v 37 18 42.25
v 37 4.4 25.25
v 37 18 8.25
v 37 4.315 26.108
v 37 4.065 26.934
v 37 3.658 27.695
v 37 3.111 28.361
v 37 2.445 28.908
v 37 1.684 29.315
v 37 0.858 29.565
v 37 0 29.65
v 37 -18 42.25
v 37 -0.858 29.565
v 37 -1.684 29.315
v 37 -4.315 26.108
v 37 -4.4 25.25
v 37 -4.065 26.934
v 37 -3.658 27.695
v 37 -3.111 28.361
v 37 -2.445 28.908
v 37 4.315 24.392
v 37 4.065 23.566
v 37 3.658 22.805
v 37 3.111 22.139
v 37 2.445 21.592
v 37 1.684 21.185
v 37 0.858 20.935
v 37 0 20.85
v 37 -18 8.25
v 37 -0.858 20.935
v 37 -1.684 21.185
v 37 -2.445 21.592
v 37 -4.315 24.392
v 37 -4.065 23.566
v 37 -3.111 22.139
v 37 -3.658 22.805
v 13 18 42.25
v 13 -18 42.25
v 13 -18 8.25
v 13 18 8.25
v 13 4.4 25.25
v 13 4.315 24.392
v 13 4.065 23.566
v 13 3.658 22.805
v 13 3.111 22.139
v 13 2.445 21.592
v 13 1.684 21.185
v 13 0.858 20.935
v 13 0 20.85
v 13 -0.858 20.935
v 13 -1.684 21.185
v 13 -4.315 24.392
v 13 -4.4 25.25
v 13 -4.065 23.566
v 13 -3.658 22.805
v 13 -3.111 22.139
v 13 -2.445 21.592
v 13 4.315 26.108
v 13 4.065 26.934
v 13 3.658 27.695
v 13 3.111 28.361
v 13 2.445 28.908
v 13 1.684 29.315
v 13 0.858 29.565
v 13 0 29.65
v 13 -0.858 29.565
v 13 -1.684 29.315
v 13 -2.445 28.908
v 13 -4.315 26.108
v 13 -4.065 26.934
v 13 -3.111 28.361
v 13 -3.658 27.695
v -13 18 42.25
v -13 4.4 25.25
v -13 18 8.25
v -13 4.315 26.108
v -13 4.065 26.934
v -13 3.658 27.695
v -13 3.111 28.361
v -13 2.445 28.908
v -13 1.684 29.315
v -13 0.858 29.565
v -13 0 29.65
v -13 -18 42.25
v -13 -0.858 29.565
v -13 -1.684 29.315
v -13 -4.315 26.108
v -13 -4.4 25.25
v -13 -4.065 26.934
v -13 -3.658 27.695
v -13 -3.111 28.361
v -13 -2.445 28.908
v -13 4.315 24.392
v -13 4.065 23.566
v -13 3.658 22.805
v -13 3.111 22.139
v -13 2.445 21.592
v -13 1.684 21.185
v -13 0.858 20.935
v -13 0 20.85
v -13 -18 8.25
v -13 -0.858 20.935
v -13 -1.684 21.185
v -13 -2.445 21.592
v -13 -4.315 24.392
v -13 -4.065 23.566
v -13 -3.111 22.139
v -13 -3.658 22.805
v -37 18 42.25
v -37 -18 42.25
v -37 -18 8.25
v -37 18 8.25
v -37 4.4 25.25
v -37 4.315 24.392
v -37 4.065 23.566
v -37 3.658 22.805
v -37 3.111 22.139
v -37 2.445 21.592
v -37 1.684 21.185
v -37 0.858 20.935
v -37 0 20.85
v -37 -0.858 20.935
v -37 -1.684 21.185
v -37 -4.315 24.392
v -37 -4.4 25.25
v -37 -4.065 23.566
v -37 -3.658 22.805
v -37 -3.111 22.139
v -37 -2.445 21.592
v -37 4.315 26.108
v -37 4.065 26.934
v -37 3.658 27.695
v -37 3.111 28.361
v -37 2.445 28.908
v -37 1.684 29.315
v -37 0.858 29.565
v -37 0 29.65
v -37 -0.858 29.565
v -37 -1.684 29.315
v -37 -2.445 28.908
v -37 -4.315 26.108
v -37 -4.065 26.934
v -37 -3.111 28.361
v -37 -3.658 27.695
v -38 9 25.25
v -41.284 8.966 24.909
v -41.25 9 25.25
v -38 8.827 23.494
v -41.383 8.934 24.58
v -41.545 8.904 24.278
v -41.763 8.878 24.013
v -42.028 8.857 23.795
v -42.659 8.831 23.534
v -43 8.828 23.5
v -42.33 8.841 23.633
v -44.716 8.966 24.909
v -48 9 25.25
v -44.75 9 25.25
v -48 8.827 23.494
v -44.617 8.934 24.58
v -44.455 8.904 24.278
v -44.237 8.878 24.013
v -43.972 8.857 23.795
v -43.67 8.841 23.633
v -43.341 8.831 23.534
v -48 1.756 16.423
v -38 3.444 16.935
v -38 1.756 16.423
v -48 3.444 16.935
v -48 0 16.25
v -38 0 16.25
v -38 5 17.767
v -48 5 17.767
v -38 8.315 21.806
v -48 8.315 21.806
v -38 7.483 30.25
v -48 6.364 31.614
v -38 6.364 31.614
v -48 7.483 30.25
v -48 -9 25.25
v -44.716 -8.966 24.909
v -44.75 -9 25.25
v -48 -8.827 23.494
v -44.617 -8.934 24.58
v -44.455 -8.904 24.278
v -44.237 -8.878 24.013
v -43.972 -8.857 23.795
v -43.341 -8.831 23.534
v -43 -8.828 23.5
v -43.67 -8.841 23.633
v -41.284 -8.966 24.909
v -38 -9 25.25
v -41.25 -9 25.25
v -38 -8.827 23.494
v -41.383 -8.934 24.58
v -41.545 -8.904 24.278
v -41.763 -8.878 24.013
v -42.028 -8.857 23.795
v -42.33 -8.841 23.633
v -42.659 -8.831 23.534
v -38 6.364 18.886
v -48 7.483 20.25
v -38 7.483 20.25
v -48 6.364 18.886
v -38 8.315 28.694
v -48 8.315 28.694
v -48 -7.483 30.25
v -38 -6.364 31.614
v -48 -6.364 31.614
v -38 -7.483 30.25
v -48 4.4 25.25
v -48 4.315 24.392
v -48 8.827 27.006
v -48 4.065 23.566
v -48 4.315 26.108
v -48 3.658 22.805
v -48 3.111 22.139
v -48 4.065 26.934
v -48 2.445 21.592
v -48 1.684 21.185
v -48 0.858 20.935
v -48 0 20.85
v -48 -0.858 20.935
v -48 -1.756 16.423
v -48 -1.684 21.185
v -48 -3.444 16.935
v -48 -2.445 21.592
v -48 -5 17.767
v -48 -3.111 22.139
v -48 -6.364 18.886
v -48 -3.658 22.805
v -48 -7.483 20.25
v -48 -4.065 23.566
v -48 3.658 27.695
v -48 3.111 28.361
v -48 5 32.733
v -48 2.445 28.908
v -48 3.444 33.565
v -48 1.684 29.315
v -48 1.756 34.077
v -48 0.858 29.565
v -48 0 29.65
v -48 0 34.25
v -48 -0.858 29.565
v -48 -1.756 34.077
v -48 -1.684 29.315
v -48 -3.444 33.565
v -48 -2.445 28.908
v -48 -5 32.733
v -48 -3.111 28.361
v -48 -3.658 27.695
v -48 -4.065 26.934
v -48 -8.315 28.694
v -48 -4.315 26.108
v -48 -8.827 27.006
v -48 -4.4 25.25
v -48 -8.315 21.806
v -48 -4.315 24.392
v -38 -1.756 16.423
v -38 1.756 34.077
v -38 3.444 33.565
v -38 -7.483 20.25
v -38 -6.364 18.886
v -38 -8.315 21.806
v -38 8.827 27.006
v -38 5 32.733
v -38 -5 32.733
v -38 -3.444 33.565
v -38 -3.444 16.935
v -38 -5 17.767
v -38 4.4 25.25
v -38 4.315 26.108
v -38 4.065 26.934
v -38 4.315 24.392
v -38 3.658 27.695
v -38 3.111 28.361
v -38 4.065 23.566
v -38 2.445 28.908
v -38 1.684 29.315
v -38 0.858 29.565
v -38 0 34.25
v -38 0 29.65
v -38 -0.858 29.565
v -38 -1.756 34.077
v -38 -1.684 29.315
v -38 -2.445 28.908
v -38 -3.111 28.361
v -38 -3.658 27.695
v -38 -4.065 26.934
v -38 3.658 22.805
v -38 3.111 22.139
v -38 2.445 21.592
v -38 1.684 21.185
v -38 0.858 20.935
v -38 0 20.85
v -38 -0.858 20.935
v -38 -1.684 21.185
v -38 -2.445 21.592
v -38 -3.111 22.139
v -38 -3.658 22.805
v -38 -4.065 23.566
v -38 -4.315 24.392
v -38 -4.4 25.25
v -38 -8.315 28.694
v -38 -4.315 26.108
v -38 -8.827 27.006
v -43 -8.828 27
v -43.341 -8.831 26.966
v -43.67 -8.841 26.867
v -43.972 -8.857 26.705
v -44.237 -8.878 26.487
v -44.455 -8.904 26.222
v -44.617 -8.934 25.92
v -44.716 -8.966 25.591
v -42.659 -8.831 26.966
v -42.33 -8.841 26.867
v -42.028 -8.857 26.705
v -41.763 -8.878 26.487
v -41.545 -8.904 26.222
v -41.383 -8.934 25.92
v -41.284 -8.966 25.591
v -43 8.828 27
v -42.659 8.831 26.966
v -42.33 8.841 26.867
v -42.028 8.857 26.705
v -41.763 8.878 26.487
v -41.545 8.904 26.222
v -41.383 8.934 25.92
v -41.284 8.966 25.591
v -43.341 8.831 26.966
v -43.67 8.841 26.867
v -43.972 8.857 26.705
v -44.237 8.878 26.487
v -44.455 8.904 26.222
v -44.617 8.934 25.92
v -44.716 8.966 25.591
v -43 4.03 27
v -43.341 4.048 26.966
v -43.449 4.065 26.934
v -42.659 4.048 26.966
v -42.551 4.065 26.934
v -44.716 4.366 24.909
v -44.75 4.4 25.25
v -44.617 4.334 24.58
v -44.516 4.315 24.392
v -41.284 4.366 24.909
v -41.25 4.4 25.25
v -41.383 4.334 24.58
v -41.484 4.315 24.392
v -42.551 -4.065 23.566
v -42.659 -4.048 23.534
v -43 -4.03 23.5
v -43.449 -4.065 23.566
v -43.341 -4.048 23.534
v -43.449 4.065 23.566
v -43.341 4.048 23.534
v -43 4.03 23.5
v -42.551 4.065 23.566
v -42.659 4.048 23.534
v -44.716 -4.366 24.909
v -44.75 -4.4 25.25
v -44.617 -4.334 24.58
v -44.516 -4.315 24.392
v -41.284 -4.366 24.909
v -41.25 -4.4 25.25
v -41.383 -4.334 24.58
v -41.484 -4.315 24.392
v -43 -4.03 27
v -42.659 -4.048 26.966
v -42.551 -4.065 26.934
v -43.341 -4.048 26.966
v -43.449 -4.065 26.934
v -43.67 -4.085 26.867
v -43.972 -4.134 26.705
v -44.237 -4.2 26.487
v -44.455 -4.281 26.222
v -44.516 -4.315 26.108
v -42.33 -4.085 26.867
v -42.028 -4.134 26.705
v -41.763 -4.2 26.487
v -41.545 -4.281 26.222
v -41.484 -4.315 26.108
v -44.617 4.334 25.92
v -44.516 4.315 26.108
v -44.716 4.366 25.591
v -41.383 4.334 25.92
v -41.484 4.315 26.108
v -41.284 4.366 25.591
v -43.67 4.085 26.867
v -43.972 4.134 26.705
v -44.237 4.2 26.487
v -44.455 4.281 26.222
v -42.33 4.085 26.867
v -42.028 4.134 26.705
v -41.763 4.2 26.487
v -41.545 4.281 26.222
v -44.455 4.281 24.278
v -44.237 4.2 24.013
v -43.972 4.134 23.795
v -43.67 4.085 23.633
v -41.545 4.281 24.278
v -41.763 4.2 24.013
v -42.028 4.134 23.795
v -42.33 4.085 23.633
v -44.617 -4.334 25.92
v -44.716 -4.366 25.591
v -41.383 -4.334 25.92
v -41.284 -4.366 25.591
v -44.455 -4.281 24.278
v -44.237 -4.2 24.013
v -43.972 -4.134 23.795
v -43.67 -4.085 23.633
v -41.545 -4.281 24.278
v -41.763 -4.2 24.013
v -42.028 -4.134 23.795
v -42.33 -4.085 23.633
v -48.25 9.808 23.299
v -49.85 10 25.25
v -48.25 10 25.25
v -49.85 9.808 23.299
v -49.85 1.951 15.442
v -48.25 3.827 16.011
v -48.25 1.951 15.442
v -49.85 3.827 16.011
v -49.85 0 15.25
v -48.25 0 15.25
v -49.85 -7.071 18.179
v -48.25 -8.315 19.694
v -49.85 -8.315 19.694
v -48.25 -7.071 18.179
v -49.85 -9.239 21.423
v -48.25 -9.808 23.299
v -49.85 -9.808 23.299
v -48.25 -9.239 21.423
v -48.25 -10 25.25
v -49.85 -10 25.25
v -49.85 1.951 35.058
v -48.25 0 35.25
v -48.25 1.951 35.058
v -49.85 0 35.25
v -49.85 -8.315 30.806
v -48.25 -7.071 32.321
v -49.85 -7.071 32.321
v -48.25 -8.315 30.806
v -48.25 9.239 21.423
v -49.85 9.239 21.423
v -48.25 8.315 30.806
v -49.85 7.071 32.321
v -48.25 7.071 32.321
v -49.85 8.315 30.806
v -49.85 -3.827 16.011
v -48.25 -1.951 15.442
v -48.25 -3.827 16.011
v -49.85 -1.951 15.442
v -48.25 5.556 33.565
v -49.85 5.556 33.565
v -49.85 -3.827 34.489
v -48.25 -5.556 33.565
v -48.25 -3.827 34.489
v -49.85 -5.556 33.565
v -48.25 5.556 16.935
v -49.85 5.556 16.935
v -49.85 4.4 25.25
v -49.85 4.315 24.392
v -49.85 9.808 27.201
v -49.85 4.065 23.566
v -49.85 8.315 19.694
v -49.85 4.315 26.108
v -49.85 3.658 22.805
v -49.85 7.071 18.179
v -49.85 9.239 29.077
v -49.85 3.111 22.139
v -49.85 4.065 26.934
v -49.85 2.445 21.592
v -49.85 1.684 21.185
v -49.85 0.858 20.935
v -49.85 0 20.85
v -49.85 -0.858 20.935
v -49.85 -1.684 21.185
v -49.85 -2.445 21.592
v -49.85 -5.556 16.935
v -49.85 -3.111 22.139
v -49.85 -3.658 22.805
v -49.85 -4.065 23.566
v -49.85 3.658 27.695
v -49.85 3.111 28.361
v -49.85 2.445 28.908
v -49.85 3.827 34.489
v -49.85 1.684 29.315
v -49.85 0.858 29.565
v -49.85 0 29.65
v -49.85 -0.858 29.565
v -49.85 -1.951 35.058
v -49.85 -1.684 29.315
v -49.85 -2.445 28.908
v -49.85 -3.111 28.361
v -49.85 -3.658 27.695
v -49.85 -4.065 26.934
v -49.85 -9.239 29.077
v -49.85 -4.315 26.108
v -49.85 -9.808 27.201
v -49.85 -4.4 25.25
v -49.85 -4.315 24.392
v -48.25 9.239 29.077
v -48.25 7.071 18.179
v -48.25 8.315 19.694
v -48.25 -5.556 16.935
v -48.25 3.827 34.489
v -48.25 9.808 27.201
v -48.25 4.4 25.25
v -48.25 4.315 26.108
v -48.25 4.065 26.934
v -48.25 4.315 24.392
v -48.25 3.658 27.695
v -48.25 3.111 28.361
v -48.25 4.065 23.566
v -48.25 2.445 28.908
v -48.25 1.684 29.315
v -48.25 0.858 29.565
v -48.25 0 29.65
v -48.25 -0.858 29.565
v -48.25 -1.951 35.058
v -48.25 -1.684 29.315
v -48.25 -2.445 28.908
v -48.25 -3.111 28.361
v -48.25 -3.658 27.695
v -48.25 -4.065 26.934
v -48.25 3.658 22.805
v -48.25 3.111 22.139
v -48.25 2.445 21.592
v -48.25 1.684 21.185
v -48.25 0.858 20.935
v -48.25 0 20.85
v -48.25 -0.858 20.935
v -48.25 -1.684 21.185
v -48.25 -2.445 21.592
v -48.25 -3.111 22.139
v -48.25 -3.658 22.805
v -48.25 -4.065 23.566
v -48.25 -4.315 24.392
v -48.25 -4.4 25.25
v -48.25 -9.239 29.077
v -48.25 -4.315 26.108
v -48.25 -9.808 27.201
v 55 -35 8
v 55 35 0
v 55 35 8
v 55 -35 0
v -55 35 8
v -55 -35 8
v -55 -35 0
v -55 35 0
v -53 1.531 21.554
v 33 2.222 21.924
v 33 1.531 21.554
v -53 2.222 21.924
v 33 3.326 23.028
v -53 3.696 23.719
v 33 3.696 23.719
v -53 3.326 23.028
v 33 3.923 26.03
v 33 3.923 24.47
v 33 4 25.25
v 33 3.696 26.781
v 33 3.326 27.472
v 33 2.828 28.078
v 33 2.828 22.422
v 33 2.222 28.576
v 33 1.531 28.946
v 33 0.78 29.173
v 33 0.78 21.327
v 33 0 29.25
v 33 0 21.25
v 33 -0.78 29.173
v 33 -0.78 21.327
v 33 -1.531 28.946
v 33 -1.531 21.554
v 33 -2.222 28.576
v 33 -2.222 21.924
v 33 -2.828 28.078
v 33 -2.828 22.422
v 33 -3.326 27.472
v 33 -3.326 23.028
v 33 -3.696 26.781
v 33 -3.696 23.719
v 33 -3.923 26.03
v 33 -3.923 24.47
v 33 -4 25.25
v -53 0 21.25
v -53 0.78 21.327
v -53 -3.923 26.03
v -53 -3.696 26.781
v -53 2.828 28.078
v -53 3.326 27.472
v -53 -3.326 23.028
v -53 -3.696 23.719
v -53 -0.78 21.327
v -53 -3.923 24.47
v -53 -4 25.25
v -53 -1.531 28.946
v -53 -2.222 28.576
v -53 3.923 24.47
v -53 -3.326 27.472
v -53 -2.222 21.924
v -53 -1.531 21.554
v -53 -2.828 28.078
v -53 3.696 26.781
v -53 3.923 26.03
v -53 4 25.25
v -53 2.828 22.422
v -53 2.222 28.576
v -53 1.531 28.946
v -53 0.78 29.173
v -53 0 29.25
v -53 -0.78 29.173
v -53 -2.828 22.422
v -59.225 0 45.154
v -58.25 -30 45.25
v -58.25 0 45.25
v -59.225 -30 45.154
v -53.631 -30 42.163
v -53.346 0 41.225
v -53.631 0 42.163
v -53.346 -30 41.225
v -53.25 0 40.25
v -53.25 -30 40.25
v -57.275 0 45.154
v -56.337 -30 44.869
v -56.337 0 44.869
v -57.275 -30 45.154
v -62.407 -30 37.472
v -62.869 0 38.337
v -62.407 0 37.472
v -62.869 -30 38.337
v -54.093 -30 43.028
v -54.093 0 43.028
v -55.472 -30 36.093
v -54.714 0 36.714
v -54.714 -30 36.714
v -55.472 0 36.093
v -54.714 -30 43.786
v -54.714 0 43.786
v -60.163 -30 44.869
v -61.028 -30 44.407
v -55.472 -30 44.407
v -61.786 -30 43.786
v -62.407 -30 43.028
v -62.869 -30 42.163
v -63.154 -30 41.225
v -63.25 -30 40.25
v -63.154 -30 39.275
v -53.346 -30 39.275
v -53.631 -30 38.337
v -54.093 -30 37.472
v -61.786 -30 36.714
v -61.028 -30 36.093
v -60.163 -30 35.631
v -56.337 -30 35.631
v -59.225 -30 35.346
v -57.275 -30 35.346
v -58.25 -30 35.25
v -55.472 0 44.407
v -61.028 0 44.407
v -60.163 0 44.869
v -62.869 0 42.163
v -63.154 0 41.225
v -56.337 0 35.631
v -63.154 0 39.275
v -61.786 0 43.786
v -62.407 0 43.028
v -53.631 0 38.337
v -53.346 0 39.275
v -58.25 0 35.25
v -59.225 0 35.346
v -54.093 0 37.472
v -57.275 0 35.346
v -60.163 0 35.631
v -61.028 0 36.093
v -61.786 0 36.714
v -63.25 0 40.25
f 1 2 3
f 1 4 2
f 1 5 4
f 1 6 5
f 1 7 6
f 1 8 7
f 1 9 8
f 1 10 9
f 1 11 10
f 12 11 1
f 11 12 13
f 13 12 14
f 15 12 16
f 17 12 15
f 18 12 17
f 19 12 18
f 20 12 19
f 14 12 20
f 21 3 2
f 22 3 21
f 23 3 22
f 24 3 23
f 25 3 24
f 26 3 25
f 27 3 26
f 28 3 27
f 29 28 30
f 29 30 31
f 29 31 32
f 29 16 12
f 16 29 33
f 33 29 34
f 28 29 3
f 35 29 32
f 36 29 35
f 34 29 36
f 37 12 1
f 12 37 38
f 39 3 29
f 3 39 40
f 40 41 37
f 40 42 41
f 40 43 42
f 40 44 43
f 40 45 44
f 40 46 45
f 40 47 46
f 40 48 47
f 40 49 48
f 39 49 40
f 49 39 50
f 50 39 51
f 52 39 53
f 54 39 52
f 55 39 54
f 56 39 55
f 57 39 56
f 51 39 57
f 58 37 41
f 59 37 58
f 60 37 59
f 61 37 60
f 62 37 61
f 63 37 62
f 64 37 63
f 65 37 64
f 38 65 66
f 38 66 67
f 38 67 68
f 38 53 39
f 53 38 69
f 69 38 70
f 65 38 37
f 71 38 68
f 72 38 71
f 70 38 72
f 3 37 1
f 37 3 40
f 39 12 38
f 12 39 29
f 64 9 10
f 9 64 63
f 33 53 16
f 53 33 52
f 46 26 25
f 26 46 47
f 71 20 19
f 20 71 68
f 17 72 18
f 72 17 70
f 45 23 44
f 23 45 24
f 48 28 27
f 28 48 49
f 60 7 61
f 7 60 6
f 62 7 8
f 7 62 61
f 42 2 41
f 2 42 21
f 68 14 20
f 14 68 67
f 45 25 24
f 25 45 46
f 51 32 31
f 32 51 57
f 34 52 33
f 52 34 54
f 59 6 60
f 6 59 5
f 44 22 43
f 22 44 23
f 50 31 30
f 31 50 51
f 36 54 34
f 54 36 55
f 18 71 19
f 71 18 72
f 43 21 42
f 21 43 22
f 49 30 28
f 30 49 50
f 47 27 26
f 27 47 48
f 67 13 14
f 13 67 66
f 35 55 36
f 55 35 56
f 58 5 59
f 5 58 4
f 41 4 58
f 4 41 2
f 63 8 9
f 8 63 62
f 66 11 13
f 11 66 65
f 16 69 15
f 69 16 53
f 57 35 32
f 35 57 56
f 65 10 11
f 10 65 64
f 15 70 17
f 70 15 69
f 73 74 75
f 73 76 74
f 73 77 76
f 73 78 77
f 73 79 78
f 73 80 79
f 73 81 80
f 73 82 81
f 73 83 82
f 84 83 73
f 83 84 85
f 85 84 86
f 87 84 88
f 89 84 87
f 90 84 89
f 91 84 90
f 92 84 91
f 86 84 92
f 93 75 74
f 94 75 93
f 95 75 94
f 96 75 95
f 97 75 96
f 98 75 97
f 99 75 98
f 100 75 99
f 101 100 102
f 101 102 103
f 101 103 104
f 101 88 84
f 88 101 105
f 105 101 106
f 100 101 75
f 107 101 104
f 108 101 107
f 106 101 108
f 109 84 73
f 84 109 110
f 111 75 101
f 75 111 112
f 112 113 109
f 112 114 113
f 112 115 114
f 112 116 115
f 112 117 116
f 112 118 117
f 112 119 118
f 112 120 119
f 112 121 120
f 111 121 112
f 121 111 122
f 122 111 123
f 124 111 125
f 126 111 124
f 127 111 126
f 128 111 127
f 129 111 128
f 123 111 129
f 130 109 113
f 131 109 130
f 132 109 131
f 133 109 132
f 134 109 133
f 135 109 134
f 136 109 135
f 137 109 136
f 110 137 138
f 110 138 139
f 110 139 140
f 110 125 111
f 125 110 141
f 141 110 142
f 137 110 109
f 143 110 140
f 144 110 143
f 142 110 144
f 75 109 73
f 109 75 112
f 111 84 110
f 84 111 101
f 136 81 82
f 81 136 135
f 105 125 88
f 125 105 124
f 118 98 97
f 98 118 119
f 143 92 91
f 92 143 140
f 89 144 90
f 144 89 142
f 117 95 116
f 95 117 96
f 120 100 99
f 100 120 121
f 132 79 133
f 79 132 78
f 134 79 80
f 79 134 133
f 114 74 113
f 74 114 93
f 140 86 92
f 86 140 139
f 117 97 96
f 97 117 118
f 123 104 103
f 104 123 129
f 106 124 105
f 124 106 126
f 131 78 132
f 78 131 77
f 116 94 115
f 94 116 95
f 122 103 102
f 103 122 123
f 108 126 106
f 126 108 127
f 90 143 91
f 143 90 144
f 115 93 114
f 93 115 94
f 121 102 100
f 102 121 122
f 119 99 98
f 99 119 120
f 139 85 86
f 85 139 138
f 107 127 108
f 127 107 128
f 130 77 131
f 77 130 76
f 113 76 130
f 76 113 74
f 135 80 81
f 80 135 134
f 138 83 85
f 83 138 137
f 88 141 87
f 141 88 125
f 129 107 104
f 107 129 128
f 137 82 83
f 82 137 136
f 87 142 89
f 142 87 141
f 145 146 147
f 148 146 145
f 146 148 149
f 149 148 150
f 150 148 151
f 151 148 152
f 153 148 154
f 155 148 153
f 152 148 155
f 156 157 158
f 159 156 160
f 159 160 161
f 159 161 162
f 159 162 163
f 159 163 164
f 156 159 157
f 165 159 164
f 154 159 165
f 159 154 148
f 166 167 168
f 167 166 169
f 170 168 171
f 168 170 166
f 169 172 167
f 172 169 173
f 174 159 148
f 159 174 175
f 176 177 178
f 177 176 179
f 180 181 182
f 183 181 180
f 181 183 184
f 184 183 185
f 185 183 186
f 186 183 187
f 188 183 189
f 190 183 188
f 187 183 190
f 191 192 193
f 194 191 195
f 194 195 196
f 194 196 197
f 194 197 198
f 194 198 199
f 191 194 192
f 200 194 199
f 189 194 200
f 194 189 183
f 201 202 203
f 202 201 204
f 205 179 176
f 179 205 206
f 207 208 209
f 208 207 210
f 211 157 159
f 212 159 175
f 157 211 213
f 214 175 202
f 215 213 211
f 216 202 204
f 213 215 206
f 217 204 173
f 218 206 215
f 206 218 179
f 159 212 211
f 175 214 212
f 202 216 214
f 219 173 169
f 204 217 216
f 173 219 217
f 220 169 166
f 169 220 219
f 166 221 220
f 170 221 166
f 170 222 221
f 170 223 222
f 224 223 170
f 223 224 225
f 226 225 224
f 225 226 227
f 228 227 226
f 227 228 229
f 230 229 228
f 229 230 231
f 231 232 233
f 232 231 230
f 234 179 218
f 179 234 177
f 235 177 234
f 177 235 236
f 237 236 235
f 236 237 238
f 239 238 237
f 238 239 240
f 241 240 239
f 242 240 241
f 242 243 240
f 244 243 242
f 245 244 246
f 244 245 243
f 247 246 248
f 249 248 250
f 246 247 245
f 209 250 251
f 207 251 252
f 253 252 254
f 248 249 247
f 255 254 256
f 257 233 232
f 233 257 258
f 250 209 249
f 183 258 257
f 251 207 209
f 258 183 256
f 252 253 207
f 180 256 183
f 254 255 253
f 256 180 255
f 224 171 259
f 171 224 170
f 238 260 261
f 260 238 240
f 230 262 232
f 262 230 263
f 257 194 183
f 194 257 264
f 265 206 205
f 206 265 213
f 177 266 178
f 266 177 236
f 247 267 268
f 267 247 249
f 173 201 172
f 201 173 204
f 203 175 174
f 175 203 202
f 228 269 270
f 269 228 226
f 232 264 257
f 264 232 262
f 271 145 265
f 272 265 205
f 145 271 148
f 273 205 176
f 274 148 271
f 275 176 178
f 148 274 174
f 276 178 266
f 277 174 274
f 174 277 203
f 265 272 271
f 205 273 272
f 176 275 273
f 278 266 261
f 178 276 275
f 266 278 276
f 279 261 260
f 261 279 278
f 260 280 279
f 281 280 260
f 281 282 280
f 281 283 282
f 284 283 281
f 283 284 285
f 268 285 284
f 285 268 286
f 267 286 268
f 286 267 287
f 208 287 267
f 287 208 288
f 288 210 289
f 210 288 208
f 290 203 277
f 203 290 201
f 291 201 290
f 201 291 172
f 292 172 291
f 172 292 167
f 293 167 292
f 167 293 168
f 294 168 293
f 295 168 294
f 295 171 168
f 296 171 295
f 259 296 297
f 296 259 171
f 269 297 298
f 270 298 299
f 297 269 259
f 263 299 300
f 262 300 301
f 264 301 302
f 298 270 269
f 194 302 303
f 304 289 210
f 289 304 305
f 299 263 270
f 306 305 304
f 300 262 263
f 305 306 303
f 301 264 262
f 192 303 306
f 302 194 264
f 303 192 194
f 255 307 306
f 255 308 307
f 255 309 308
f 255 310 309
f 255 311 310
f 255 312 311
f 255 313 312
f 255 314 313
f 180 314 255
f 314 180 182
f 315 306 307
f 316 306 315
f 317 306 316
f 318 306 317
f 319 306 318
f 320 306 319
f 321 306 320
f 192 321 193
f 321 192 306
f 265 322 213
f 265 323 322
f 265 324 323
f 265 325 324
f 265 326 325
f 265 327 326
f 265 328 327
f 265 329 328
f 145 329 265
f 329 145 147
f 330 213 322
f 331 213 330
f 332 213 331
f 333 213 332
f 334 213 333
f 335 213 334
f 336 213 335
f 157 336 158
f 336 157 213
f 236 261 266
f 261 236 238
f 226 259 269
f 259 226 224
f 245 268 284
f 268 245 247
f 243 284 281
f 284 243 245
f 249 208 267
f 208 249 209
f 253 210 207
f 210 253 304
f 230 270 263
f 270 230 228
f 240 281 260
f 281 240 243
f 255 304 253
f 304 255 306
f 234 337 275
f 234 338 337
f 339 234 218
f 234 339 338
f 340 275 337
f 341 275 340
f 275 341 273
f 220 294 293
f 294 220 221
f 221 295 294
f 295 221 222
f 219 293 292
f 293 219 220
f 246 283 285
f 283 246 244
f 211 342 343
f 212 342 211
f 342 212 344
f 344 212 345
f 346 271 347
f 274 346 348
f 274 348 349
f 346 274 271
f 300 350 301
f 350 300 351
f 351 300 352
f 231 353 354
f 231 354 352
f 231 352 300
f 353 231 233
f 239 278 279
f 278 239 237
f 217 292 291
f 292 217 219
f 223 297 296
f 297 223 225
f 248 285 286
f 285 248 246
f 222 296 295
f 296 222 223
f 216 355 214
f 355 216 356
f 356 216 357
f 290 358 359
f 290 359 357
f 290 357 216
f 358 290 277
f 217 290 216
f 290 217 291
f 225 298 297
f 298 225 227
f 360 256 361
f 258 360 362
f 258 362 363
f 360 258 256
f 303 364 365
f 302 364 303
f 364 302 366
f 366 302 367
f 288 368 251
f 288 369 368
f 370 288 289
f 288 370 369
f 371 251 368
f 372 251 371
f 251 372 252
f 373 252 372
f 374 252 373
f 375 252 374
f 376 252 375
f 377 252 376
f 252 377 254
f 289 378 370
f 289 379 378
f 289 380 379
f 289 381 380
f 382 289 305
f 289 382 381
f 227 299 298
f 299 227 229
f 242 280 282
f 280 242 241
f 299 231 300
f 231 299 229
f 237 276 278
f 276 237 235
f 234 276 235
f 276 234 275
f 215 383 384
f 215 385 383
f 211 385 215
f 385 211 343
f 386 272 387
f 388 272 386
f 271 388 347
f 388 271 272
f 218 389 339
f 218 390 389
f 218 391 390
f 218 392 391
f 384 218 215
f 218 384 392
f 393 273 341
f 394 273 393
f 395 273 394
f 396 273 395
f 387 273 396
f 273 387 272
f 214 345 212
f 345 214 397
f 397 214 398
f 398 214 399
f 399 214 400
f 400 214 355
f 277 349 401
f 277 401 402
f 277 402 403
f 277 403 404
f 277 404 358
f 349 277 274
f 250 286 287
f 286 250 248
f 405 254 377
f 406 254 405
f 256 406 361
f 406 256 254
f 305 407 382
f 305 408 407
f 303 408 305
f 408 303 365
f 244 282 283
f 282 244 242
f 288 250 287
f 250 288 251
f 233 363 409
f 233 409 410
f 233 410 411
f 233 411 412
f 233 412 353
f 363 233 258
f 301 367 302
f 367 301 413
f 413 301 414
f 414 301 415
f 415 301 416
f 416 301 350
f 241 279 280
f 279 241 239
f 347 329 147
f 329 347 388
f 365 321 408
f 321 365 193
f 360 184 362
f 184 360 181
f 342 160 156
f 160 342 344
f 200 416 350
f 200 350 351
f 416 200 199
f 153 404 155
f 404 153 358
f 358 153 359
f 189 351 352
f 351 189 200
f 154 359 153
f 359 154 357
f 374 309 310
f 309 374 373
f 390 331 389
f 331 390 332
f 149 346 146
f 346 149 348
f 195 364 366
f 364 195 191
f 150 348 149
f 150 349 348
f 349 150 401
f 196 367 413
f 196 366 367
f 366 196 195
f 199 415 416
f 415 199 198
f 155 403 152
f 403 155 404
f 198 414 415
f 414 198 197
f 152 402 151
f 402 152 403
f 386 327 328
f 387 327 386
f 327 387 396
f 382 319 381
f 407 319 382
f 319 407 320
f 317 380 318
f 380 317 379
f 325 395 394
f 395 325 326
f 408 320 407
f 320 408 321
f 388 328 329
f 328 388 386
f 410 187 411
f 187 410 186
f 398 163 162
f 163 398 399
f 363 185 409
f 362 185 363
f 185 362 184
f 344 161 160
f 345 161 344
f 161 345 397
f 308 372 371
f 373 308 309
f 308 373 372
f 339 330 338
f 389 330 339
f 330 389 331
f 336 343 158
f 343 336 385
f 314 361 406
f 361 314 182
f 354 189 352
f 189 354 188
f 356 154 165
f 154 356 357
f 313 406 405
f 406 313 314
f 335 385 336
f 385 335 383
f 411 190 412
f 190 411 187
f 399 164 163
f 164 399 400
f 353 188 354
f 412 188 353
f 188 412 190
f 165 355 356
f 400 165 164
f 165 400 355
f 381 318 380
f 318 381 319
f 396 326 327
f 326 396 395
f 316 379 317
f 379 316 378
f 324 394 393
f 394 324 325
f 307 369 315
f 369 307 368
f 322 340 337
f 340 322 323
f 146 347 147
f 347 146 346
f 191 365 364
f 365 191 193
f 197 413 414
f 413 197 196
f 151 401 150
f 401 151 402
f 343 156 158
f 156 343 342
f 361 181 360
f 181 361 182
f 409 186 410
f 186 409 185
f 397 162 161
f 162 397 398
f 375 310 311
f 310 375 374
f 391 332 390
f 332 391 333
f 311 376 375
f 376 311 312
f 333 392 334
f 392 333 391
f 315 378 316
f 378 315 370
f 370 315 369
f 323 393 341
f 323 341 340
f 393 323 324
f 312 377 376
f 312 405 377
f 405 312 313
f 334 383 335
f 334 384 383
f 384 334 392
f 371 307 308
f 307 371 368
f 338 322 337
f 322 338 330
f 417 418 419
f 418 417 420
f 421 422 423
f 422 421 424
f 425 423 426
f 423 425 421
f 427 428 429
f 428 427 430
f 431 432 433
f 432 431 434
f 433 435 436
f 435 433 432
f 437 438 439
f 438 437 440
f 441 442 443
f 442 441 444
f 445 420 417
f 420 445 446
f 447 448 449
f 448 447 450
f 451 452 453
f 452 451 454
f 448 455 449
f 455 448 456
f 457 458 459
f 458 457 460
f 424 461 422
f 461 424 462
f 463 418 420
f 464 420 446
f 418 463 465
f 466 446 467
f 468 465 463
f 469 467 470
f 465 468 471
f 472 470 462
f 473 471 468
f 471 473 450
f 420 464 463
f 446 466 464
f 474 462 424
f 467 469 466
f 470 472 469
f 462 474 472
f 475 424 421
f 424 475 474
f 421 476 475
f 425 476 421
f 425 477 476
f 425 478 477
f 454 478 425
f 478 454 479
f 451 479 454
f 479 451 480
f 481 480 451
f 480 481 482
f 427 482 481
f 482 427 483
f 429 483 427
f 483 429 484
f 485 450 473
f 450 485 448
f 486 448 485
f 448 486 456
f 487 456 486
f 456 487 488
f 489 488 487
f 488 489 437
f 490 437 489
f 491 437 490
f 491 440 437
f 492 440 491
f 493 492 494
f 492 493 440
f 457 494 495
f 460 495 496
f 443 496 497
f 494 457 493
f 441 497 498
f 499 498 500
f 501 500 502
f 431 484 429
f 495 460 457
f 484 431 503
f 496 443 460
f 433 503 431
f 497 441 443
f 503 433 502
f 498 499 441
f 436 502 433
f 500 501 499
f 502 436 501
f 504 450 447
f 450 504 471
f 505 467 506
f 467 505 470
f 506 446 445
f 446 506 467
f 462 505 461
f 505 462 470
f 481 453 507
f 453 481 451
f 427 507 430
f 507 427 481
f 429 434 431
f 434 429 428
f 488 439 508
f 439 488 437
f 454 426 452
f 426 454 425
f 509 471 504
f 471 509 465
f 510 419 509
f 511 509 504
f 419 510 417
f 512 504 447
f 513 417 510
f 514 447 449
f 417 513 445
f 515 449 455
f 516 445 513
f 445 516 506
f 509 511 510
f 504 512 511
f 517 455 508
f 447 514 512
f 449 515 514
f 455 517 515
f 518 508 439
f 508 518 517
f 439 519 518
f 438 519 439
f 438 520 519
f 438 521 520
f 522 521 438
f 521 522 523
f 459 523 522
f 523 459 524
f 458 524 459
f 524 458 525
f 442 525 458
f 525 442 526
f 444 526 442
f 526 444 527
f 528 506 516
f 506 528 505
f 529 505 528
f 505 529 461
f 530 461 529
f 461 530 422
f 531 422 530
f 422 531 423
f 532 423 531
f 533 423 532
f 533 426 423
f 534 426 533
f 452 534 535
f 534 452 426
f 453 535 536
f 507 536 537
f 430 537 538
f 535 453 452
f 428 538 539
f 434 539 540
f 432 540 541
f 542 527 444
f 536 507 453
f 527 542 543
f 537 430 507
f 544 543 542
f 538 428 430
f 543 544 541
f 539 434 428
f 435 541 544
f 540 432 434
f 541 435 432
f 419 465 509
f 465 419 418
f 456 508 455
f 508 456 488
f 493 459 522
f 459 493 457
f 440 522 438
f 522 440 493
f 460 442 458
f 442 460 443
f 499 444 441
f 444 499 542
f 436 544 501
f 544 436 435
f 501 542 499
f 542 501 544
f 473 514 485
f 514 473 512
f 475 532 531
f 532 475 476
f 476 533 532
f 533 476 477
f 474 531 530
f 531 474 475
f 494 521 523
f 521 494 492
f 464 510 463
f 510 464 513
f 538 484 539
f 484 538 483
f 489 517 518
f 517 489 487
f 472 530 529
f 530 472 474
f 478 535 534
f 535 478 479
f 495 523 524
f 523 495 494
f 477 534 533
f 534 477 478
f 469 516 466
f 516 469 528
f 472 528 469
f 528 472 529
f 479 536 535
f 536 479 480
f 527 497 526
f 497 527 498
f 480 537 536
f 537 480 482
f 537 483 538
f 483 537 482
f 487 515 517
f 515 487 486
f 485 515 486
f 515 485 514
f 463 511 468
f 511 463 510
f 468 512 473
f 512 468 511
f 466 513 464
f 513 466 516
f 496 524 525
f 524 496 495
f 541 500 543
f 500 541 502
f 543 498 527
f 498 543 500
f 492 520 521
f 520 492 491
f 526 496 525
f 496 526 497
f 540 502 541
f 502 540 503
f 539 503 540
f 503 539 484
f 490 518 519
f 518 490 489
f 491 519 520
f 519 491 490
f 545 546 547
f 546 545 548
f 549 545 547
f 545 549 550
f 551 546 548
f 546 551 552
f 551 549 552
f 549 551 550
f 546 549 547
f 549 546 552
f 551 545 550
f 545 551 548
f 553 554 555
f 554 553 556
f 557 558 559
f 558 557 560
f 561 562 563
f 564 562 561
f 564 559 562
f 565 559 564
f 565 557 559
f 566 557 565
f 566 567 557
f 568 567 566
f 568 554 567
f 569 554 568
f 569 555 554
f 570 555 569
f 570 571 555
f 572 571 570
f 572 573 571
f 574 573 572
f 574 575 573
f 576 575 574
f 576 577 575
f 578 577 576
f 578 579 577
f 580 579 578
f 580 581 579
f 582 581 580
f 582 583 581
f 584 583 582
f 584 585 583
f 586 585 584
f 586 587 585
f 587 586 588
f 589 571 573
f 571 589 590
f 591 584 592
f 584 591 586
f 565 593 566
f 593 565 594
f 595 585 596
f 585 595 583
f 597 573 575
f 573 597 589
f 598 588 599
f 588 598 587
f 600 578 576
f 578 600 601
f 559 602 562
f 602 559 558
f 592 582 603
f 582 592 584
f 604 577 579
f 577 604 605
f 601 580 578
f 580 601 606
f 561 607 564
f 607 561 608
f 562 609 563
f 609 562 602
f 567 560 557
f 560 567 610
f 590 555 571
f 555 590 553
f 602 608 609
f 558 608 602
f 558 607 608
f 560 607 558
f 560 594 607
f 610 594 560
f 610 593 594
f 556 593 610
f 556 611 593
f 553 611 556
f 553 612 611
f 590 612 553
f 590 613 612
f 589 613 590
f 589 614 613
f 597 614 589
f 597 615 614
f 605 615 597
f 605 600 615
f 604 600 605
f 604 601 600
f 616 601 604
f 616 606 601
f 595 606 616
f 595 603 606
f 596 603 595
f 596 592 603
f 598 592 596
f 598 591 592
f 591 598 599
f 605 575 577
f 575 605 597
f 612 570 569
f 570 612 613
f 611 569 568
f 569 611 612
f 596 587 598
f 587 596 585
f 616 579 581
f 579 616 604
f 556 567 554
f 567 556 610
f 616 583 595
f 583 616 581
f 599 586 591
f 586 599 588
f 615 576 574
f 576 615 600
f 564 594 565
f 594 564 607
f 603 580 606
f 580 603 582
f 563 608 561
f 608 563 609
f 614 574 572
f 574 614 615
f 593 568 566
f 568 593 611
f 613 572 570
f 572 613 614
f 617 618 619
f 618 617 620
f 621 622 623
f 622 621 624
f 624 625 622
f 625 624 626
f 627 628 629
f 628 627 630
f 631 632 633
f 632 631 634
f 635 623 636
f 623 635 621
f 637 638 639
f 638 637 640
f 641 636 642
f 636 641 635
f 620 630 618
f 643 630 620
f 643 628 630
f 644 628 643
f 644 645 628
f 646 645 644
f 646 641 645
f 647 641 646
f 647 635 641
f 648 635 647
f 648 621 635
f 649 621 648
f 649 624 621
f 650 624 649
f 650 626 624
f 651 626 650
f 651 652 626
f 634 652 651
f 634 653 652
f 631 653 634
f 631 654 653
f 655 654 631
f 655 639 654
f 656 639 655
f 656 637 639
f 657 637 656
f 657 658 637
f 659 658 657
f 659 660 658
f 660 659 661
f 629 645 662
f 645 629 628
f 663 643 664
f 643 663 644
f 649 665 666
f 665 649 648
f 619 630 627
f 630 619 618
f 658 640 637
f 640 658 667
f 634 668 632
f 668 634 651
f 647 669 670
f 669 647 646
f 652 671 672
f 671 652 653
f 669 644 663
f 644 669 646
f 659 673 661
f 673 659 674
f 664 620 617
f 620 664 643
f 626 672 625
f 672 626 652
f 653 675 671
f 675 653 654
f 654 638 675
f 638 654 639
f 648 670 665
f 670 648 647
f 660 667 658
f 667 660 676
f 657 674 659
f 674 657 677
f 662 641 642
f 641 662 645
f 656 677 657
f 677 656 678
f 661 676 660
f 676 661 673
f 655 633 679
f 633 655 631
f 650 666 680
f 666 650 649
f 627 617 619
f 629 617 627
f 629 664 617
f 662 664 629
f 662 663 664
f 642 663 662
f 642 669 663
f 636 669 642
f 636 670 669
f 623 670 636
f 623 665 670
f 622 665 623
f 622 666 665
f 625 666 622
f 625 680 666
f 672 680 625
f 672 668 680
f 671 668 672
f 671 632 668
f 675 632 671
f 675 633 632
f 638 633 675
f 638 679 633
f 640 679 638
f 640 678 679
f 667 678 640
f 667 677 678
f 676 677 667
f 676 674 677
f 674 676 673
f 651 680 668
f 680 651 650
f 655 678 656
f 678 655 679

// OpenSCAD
$fn = 32;

// ------------------------------------------------------------------------
// Machine vise: screw d8, jaws 24 x 34 mm
// Every part is its own module, assembly() places every instance.
// ------------------------------------------------------------------------

// --- part 1 ---
module vise_bed() {
  difference() {
    translate([-55, -35, 0]) cube([110, 70, 8]);
  }
}

// --- part 2 ---
module vise_jaw() {
  difference() {
    translate([-12, -18, 0]) cube([24, 36, 34]);
    translate([0, 0, 17]) rotate([0, 90, 0]) cylinder(h = 26, d = 8.8, center = true);
  }
}

// --- part 3 ---
module vise_screw() {
  translate([0, 0, -43]) cylinder(h = 86, d = 8);
}

// --- part 4 ---
module screw_collar() {
  difference() {
    cylinder(h = 10, d = 18);
    translate([0, 0, -1]) cylinder(h = 12, d = 8.8);
    translate([0, 0, 5]) rotate([90, 0, 0]) cylinder(h = 20, d = 3.5, center = true);
  }
}

// --- part 5 ---
module screw_washer() {
  difference() {
      translate([0, 0, 0]) cylinder(h = 1.6, d = 20);
      translate([0, 0, -1]) cylinder(h = 3.6, d = 8.8);
    }
}

// --- part 6 ---
module vise_handle() {
  cylinder(h = 30, d = 10);
}

// --- assembly ---
module assembly() {
  color([0.80, 0.24, 0.20]) translate([0, 0, 0]) rotate([0, 0, 0]) vise_bed();
  color([0.20, 0.45, 0.75]) translate([25, 0, 8.25]) rotate([0, 0, 0]) vise_jaw();
  color([0.25, 0.62, 0.32]) translate([-25, 0, 8.25]) rotate([0, 0, 0]) vise_jaw();
  color([0.92, 0.70, 0.18]) translate([-10, 0, 25.25]) rotate([0, 90, 0]) vise_screw();
  color([0.58, 0.35, 0.70]) translate([-48, 0, 25.25]) rotate([0, 90, 0]) screw_collar();
  color([0.16, 0.66, 0.66]) translate([-49.85, 0, 25.25]) rotate([0, 90, 0]) screw_washer();
  color([0.85, 0.48, 0.18]) translate([-58.25, 0, 40.25]) rotate([90, 0, 0]) vise_handle();
}

assembly();
